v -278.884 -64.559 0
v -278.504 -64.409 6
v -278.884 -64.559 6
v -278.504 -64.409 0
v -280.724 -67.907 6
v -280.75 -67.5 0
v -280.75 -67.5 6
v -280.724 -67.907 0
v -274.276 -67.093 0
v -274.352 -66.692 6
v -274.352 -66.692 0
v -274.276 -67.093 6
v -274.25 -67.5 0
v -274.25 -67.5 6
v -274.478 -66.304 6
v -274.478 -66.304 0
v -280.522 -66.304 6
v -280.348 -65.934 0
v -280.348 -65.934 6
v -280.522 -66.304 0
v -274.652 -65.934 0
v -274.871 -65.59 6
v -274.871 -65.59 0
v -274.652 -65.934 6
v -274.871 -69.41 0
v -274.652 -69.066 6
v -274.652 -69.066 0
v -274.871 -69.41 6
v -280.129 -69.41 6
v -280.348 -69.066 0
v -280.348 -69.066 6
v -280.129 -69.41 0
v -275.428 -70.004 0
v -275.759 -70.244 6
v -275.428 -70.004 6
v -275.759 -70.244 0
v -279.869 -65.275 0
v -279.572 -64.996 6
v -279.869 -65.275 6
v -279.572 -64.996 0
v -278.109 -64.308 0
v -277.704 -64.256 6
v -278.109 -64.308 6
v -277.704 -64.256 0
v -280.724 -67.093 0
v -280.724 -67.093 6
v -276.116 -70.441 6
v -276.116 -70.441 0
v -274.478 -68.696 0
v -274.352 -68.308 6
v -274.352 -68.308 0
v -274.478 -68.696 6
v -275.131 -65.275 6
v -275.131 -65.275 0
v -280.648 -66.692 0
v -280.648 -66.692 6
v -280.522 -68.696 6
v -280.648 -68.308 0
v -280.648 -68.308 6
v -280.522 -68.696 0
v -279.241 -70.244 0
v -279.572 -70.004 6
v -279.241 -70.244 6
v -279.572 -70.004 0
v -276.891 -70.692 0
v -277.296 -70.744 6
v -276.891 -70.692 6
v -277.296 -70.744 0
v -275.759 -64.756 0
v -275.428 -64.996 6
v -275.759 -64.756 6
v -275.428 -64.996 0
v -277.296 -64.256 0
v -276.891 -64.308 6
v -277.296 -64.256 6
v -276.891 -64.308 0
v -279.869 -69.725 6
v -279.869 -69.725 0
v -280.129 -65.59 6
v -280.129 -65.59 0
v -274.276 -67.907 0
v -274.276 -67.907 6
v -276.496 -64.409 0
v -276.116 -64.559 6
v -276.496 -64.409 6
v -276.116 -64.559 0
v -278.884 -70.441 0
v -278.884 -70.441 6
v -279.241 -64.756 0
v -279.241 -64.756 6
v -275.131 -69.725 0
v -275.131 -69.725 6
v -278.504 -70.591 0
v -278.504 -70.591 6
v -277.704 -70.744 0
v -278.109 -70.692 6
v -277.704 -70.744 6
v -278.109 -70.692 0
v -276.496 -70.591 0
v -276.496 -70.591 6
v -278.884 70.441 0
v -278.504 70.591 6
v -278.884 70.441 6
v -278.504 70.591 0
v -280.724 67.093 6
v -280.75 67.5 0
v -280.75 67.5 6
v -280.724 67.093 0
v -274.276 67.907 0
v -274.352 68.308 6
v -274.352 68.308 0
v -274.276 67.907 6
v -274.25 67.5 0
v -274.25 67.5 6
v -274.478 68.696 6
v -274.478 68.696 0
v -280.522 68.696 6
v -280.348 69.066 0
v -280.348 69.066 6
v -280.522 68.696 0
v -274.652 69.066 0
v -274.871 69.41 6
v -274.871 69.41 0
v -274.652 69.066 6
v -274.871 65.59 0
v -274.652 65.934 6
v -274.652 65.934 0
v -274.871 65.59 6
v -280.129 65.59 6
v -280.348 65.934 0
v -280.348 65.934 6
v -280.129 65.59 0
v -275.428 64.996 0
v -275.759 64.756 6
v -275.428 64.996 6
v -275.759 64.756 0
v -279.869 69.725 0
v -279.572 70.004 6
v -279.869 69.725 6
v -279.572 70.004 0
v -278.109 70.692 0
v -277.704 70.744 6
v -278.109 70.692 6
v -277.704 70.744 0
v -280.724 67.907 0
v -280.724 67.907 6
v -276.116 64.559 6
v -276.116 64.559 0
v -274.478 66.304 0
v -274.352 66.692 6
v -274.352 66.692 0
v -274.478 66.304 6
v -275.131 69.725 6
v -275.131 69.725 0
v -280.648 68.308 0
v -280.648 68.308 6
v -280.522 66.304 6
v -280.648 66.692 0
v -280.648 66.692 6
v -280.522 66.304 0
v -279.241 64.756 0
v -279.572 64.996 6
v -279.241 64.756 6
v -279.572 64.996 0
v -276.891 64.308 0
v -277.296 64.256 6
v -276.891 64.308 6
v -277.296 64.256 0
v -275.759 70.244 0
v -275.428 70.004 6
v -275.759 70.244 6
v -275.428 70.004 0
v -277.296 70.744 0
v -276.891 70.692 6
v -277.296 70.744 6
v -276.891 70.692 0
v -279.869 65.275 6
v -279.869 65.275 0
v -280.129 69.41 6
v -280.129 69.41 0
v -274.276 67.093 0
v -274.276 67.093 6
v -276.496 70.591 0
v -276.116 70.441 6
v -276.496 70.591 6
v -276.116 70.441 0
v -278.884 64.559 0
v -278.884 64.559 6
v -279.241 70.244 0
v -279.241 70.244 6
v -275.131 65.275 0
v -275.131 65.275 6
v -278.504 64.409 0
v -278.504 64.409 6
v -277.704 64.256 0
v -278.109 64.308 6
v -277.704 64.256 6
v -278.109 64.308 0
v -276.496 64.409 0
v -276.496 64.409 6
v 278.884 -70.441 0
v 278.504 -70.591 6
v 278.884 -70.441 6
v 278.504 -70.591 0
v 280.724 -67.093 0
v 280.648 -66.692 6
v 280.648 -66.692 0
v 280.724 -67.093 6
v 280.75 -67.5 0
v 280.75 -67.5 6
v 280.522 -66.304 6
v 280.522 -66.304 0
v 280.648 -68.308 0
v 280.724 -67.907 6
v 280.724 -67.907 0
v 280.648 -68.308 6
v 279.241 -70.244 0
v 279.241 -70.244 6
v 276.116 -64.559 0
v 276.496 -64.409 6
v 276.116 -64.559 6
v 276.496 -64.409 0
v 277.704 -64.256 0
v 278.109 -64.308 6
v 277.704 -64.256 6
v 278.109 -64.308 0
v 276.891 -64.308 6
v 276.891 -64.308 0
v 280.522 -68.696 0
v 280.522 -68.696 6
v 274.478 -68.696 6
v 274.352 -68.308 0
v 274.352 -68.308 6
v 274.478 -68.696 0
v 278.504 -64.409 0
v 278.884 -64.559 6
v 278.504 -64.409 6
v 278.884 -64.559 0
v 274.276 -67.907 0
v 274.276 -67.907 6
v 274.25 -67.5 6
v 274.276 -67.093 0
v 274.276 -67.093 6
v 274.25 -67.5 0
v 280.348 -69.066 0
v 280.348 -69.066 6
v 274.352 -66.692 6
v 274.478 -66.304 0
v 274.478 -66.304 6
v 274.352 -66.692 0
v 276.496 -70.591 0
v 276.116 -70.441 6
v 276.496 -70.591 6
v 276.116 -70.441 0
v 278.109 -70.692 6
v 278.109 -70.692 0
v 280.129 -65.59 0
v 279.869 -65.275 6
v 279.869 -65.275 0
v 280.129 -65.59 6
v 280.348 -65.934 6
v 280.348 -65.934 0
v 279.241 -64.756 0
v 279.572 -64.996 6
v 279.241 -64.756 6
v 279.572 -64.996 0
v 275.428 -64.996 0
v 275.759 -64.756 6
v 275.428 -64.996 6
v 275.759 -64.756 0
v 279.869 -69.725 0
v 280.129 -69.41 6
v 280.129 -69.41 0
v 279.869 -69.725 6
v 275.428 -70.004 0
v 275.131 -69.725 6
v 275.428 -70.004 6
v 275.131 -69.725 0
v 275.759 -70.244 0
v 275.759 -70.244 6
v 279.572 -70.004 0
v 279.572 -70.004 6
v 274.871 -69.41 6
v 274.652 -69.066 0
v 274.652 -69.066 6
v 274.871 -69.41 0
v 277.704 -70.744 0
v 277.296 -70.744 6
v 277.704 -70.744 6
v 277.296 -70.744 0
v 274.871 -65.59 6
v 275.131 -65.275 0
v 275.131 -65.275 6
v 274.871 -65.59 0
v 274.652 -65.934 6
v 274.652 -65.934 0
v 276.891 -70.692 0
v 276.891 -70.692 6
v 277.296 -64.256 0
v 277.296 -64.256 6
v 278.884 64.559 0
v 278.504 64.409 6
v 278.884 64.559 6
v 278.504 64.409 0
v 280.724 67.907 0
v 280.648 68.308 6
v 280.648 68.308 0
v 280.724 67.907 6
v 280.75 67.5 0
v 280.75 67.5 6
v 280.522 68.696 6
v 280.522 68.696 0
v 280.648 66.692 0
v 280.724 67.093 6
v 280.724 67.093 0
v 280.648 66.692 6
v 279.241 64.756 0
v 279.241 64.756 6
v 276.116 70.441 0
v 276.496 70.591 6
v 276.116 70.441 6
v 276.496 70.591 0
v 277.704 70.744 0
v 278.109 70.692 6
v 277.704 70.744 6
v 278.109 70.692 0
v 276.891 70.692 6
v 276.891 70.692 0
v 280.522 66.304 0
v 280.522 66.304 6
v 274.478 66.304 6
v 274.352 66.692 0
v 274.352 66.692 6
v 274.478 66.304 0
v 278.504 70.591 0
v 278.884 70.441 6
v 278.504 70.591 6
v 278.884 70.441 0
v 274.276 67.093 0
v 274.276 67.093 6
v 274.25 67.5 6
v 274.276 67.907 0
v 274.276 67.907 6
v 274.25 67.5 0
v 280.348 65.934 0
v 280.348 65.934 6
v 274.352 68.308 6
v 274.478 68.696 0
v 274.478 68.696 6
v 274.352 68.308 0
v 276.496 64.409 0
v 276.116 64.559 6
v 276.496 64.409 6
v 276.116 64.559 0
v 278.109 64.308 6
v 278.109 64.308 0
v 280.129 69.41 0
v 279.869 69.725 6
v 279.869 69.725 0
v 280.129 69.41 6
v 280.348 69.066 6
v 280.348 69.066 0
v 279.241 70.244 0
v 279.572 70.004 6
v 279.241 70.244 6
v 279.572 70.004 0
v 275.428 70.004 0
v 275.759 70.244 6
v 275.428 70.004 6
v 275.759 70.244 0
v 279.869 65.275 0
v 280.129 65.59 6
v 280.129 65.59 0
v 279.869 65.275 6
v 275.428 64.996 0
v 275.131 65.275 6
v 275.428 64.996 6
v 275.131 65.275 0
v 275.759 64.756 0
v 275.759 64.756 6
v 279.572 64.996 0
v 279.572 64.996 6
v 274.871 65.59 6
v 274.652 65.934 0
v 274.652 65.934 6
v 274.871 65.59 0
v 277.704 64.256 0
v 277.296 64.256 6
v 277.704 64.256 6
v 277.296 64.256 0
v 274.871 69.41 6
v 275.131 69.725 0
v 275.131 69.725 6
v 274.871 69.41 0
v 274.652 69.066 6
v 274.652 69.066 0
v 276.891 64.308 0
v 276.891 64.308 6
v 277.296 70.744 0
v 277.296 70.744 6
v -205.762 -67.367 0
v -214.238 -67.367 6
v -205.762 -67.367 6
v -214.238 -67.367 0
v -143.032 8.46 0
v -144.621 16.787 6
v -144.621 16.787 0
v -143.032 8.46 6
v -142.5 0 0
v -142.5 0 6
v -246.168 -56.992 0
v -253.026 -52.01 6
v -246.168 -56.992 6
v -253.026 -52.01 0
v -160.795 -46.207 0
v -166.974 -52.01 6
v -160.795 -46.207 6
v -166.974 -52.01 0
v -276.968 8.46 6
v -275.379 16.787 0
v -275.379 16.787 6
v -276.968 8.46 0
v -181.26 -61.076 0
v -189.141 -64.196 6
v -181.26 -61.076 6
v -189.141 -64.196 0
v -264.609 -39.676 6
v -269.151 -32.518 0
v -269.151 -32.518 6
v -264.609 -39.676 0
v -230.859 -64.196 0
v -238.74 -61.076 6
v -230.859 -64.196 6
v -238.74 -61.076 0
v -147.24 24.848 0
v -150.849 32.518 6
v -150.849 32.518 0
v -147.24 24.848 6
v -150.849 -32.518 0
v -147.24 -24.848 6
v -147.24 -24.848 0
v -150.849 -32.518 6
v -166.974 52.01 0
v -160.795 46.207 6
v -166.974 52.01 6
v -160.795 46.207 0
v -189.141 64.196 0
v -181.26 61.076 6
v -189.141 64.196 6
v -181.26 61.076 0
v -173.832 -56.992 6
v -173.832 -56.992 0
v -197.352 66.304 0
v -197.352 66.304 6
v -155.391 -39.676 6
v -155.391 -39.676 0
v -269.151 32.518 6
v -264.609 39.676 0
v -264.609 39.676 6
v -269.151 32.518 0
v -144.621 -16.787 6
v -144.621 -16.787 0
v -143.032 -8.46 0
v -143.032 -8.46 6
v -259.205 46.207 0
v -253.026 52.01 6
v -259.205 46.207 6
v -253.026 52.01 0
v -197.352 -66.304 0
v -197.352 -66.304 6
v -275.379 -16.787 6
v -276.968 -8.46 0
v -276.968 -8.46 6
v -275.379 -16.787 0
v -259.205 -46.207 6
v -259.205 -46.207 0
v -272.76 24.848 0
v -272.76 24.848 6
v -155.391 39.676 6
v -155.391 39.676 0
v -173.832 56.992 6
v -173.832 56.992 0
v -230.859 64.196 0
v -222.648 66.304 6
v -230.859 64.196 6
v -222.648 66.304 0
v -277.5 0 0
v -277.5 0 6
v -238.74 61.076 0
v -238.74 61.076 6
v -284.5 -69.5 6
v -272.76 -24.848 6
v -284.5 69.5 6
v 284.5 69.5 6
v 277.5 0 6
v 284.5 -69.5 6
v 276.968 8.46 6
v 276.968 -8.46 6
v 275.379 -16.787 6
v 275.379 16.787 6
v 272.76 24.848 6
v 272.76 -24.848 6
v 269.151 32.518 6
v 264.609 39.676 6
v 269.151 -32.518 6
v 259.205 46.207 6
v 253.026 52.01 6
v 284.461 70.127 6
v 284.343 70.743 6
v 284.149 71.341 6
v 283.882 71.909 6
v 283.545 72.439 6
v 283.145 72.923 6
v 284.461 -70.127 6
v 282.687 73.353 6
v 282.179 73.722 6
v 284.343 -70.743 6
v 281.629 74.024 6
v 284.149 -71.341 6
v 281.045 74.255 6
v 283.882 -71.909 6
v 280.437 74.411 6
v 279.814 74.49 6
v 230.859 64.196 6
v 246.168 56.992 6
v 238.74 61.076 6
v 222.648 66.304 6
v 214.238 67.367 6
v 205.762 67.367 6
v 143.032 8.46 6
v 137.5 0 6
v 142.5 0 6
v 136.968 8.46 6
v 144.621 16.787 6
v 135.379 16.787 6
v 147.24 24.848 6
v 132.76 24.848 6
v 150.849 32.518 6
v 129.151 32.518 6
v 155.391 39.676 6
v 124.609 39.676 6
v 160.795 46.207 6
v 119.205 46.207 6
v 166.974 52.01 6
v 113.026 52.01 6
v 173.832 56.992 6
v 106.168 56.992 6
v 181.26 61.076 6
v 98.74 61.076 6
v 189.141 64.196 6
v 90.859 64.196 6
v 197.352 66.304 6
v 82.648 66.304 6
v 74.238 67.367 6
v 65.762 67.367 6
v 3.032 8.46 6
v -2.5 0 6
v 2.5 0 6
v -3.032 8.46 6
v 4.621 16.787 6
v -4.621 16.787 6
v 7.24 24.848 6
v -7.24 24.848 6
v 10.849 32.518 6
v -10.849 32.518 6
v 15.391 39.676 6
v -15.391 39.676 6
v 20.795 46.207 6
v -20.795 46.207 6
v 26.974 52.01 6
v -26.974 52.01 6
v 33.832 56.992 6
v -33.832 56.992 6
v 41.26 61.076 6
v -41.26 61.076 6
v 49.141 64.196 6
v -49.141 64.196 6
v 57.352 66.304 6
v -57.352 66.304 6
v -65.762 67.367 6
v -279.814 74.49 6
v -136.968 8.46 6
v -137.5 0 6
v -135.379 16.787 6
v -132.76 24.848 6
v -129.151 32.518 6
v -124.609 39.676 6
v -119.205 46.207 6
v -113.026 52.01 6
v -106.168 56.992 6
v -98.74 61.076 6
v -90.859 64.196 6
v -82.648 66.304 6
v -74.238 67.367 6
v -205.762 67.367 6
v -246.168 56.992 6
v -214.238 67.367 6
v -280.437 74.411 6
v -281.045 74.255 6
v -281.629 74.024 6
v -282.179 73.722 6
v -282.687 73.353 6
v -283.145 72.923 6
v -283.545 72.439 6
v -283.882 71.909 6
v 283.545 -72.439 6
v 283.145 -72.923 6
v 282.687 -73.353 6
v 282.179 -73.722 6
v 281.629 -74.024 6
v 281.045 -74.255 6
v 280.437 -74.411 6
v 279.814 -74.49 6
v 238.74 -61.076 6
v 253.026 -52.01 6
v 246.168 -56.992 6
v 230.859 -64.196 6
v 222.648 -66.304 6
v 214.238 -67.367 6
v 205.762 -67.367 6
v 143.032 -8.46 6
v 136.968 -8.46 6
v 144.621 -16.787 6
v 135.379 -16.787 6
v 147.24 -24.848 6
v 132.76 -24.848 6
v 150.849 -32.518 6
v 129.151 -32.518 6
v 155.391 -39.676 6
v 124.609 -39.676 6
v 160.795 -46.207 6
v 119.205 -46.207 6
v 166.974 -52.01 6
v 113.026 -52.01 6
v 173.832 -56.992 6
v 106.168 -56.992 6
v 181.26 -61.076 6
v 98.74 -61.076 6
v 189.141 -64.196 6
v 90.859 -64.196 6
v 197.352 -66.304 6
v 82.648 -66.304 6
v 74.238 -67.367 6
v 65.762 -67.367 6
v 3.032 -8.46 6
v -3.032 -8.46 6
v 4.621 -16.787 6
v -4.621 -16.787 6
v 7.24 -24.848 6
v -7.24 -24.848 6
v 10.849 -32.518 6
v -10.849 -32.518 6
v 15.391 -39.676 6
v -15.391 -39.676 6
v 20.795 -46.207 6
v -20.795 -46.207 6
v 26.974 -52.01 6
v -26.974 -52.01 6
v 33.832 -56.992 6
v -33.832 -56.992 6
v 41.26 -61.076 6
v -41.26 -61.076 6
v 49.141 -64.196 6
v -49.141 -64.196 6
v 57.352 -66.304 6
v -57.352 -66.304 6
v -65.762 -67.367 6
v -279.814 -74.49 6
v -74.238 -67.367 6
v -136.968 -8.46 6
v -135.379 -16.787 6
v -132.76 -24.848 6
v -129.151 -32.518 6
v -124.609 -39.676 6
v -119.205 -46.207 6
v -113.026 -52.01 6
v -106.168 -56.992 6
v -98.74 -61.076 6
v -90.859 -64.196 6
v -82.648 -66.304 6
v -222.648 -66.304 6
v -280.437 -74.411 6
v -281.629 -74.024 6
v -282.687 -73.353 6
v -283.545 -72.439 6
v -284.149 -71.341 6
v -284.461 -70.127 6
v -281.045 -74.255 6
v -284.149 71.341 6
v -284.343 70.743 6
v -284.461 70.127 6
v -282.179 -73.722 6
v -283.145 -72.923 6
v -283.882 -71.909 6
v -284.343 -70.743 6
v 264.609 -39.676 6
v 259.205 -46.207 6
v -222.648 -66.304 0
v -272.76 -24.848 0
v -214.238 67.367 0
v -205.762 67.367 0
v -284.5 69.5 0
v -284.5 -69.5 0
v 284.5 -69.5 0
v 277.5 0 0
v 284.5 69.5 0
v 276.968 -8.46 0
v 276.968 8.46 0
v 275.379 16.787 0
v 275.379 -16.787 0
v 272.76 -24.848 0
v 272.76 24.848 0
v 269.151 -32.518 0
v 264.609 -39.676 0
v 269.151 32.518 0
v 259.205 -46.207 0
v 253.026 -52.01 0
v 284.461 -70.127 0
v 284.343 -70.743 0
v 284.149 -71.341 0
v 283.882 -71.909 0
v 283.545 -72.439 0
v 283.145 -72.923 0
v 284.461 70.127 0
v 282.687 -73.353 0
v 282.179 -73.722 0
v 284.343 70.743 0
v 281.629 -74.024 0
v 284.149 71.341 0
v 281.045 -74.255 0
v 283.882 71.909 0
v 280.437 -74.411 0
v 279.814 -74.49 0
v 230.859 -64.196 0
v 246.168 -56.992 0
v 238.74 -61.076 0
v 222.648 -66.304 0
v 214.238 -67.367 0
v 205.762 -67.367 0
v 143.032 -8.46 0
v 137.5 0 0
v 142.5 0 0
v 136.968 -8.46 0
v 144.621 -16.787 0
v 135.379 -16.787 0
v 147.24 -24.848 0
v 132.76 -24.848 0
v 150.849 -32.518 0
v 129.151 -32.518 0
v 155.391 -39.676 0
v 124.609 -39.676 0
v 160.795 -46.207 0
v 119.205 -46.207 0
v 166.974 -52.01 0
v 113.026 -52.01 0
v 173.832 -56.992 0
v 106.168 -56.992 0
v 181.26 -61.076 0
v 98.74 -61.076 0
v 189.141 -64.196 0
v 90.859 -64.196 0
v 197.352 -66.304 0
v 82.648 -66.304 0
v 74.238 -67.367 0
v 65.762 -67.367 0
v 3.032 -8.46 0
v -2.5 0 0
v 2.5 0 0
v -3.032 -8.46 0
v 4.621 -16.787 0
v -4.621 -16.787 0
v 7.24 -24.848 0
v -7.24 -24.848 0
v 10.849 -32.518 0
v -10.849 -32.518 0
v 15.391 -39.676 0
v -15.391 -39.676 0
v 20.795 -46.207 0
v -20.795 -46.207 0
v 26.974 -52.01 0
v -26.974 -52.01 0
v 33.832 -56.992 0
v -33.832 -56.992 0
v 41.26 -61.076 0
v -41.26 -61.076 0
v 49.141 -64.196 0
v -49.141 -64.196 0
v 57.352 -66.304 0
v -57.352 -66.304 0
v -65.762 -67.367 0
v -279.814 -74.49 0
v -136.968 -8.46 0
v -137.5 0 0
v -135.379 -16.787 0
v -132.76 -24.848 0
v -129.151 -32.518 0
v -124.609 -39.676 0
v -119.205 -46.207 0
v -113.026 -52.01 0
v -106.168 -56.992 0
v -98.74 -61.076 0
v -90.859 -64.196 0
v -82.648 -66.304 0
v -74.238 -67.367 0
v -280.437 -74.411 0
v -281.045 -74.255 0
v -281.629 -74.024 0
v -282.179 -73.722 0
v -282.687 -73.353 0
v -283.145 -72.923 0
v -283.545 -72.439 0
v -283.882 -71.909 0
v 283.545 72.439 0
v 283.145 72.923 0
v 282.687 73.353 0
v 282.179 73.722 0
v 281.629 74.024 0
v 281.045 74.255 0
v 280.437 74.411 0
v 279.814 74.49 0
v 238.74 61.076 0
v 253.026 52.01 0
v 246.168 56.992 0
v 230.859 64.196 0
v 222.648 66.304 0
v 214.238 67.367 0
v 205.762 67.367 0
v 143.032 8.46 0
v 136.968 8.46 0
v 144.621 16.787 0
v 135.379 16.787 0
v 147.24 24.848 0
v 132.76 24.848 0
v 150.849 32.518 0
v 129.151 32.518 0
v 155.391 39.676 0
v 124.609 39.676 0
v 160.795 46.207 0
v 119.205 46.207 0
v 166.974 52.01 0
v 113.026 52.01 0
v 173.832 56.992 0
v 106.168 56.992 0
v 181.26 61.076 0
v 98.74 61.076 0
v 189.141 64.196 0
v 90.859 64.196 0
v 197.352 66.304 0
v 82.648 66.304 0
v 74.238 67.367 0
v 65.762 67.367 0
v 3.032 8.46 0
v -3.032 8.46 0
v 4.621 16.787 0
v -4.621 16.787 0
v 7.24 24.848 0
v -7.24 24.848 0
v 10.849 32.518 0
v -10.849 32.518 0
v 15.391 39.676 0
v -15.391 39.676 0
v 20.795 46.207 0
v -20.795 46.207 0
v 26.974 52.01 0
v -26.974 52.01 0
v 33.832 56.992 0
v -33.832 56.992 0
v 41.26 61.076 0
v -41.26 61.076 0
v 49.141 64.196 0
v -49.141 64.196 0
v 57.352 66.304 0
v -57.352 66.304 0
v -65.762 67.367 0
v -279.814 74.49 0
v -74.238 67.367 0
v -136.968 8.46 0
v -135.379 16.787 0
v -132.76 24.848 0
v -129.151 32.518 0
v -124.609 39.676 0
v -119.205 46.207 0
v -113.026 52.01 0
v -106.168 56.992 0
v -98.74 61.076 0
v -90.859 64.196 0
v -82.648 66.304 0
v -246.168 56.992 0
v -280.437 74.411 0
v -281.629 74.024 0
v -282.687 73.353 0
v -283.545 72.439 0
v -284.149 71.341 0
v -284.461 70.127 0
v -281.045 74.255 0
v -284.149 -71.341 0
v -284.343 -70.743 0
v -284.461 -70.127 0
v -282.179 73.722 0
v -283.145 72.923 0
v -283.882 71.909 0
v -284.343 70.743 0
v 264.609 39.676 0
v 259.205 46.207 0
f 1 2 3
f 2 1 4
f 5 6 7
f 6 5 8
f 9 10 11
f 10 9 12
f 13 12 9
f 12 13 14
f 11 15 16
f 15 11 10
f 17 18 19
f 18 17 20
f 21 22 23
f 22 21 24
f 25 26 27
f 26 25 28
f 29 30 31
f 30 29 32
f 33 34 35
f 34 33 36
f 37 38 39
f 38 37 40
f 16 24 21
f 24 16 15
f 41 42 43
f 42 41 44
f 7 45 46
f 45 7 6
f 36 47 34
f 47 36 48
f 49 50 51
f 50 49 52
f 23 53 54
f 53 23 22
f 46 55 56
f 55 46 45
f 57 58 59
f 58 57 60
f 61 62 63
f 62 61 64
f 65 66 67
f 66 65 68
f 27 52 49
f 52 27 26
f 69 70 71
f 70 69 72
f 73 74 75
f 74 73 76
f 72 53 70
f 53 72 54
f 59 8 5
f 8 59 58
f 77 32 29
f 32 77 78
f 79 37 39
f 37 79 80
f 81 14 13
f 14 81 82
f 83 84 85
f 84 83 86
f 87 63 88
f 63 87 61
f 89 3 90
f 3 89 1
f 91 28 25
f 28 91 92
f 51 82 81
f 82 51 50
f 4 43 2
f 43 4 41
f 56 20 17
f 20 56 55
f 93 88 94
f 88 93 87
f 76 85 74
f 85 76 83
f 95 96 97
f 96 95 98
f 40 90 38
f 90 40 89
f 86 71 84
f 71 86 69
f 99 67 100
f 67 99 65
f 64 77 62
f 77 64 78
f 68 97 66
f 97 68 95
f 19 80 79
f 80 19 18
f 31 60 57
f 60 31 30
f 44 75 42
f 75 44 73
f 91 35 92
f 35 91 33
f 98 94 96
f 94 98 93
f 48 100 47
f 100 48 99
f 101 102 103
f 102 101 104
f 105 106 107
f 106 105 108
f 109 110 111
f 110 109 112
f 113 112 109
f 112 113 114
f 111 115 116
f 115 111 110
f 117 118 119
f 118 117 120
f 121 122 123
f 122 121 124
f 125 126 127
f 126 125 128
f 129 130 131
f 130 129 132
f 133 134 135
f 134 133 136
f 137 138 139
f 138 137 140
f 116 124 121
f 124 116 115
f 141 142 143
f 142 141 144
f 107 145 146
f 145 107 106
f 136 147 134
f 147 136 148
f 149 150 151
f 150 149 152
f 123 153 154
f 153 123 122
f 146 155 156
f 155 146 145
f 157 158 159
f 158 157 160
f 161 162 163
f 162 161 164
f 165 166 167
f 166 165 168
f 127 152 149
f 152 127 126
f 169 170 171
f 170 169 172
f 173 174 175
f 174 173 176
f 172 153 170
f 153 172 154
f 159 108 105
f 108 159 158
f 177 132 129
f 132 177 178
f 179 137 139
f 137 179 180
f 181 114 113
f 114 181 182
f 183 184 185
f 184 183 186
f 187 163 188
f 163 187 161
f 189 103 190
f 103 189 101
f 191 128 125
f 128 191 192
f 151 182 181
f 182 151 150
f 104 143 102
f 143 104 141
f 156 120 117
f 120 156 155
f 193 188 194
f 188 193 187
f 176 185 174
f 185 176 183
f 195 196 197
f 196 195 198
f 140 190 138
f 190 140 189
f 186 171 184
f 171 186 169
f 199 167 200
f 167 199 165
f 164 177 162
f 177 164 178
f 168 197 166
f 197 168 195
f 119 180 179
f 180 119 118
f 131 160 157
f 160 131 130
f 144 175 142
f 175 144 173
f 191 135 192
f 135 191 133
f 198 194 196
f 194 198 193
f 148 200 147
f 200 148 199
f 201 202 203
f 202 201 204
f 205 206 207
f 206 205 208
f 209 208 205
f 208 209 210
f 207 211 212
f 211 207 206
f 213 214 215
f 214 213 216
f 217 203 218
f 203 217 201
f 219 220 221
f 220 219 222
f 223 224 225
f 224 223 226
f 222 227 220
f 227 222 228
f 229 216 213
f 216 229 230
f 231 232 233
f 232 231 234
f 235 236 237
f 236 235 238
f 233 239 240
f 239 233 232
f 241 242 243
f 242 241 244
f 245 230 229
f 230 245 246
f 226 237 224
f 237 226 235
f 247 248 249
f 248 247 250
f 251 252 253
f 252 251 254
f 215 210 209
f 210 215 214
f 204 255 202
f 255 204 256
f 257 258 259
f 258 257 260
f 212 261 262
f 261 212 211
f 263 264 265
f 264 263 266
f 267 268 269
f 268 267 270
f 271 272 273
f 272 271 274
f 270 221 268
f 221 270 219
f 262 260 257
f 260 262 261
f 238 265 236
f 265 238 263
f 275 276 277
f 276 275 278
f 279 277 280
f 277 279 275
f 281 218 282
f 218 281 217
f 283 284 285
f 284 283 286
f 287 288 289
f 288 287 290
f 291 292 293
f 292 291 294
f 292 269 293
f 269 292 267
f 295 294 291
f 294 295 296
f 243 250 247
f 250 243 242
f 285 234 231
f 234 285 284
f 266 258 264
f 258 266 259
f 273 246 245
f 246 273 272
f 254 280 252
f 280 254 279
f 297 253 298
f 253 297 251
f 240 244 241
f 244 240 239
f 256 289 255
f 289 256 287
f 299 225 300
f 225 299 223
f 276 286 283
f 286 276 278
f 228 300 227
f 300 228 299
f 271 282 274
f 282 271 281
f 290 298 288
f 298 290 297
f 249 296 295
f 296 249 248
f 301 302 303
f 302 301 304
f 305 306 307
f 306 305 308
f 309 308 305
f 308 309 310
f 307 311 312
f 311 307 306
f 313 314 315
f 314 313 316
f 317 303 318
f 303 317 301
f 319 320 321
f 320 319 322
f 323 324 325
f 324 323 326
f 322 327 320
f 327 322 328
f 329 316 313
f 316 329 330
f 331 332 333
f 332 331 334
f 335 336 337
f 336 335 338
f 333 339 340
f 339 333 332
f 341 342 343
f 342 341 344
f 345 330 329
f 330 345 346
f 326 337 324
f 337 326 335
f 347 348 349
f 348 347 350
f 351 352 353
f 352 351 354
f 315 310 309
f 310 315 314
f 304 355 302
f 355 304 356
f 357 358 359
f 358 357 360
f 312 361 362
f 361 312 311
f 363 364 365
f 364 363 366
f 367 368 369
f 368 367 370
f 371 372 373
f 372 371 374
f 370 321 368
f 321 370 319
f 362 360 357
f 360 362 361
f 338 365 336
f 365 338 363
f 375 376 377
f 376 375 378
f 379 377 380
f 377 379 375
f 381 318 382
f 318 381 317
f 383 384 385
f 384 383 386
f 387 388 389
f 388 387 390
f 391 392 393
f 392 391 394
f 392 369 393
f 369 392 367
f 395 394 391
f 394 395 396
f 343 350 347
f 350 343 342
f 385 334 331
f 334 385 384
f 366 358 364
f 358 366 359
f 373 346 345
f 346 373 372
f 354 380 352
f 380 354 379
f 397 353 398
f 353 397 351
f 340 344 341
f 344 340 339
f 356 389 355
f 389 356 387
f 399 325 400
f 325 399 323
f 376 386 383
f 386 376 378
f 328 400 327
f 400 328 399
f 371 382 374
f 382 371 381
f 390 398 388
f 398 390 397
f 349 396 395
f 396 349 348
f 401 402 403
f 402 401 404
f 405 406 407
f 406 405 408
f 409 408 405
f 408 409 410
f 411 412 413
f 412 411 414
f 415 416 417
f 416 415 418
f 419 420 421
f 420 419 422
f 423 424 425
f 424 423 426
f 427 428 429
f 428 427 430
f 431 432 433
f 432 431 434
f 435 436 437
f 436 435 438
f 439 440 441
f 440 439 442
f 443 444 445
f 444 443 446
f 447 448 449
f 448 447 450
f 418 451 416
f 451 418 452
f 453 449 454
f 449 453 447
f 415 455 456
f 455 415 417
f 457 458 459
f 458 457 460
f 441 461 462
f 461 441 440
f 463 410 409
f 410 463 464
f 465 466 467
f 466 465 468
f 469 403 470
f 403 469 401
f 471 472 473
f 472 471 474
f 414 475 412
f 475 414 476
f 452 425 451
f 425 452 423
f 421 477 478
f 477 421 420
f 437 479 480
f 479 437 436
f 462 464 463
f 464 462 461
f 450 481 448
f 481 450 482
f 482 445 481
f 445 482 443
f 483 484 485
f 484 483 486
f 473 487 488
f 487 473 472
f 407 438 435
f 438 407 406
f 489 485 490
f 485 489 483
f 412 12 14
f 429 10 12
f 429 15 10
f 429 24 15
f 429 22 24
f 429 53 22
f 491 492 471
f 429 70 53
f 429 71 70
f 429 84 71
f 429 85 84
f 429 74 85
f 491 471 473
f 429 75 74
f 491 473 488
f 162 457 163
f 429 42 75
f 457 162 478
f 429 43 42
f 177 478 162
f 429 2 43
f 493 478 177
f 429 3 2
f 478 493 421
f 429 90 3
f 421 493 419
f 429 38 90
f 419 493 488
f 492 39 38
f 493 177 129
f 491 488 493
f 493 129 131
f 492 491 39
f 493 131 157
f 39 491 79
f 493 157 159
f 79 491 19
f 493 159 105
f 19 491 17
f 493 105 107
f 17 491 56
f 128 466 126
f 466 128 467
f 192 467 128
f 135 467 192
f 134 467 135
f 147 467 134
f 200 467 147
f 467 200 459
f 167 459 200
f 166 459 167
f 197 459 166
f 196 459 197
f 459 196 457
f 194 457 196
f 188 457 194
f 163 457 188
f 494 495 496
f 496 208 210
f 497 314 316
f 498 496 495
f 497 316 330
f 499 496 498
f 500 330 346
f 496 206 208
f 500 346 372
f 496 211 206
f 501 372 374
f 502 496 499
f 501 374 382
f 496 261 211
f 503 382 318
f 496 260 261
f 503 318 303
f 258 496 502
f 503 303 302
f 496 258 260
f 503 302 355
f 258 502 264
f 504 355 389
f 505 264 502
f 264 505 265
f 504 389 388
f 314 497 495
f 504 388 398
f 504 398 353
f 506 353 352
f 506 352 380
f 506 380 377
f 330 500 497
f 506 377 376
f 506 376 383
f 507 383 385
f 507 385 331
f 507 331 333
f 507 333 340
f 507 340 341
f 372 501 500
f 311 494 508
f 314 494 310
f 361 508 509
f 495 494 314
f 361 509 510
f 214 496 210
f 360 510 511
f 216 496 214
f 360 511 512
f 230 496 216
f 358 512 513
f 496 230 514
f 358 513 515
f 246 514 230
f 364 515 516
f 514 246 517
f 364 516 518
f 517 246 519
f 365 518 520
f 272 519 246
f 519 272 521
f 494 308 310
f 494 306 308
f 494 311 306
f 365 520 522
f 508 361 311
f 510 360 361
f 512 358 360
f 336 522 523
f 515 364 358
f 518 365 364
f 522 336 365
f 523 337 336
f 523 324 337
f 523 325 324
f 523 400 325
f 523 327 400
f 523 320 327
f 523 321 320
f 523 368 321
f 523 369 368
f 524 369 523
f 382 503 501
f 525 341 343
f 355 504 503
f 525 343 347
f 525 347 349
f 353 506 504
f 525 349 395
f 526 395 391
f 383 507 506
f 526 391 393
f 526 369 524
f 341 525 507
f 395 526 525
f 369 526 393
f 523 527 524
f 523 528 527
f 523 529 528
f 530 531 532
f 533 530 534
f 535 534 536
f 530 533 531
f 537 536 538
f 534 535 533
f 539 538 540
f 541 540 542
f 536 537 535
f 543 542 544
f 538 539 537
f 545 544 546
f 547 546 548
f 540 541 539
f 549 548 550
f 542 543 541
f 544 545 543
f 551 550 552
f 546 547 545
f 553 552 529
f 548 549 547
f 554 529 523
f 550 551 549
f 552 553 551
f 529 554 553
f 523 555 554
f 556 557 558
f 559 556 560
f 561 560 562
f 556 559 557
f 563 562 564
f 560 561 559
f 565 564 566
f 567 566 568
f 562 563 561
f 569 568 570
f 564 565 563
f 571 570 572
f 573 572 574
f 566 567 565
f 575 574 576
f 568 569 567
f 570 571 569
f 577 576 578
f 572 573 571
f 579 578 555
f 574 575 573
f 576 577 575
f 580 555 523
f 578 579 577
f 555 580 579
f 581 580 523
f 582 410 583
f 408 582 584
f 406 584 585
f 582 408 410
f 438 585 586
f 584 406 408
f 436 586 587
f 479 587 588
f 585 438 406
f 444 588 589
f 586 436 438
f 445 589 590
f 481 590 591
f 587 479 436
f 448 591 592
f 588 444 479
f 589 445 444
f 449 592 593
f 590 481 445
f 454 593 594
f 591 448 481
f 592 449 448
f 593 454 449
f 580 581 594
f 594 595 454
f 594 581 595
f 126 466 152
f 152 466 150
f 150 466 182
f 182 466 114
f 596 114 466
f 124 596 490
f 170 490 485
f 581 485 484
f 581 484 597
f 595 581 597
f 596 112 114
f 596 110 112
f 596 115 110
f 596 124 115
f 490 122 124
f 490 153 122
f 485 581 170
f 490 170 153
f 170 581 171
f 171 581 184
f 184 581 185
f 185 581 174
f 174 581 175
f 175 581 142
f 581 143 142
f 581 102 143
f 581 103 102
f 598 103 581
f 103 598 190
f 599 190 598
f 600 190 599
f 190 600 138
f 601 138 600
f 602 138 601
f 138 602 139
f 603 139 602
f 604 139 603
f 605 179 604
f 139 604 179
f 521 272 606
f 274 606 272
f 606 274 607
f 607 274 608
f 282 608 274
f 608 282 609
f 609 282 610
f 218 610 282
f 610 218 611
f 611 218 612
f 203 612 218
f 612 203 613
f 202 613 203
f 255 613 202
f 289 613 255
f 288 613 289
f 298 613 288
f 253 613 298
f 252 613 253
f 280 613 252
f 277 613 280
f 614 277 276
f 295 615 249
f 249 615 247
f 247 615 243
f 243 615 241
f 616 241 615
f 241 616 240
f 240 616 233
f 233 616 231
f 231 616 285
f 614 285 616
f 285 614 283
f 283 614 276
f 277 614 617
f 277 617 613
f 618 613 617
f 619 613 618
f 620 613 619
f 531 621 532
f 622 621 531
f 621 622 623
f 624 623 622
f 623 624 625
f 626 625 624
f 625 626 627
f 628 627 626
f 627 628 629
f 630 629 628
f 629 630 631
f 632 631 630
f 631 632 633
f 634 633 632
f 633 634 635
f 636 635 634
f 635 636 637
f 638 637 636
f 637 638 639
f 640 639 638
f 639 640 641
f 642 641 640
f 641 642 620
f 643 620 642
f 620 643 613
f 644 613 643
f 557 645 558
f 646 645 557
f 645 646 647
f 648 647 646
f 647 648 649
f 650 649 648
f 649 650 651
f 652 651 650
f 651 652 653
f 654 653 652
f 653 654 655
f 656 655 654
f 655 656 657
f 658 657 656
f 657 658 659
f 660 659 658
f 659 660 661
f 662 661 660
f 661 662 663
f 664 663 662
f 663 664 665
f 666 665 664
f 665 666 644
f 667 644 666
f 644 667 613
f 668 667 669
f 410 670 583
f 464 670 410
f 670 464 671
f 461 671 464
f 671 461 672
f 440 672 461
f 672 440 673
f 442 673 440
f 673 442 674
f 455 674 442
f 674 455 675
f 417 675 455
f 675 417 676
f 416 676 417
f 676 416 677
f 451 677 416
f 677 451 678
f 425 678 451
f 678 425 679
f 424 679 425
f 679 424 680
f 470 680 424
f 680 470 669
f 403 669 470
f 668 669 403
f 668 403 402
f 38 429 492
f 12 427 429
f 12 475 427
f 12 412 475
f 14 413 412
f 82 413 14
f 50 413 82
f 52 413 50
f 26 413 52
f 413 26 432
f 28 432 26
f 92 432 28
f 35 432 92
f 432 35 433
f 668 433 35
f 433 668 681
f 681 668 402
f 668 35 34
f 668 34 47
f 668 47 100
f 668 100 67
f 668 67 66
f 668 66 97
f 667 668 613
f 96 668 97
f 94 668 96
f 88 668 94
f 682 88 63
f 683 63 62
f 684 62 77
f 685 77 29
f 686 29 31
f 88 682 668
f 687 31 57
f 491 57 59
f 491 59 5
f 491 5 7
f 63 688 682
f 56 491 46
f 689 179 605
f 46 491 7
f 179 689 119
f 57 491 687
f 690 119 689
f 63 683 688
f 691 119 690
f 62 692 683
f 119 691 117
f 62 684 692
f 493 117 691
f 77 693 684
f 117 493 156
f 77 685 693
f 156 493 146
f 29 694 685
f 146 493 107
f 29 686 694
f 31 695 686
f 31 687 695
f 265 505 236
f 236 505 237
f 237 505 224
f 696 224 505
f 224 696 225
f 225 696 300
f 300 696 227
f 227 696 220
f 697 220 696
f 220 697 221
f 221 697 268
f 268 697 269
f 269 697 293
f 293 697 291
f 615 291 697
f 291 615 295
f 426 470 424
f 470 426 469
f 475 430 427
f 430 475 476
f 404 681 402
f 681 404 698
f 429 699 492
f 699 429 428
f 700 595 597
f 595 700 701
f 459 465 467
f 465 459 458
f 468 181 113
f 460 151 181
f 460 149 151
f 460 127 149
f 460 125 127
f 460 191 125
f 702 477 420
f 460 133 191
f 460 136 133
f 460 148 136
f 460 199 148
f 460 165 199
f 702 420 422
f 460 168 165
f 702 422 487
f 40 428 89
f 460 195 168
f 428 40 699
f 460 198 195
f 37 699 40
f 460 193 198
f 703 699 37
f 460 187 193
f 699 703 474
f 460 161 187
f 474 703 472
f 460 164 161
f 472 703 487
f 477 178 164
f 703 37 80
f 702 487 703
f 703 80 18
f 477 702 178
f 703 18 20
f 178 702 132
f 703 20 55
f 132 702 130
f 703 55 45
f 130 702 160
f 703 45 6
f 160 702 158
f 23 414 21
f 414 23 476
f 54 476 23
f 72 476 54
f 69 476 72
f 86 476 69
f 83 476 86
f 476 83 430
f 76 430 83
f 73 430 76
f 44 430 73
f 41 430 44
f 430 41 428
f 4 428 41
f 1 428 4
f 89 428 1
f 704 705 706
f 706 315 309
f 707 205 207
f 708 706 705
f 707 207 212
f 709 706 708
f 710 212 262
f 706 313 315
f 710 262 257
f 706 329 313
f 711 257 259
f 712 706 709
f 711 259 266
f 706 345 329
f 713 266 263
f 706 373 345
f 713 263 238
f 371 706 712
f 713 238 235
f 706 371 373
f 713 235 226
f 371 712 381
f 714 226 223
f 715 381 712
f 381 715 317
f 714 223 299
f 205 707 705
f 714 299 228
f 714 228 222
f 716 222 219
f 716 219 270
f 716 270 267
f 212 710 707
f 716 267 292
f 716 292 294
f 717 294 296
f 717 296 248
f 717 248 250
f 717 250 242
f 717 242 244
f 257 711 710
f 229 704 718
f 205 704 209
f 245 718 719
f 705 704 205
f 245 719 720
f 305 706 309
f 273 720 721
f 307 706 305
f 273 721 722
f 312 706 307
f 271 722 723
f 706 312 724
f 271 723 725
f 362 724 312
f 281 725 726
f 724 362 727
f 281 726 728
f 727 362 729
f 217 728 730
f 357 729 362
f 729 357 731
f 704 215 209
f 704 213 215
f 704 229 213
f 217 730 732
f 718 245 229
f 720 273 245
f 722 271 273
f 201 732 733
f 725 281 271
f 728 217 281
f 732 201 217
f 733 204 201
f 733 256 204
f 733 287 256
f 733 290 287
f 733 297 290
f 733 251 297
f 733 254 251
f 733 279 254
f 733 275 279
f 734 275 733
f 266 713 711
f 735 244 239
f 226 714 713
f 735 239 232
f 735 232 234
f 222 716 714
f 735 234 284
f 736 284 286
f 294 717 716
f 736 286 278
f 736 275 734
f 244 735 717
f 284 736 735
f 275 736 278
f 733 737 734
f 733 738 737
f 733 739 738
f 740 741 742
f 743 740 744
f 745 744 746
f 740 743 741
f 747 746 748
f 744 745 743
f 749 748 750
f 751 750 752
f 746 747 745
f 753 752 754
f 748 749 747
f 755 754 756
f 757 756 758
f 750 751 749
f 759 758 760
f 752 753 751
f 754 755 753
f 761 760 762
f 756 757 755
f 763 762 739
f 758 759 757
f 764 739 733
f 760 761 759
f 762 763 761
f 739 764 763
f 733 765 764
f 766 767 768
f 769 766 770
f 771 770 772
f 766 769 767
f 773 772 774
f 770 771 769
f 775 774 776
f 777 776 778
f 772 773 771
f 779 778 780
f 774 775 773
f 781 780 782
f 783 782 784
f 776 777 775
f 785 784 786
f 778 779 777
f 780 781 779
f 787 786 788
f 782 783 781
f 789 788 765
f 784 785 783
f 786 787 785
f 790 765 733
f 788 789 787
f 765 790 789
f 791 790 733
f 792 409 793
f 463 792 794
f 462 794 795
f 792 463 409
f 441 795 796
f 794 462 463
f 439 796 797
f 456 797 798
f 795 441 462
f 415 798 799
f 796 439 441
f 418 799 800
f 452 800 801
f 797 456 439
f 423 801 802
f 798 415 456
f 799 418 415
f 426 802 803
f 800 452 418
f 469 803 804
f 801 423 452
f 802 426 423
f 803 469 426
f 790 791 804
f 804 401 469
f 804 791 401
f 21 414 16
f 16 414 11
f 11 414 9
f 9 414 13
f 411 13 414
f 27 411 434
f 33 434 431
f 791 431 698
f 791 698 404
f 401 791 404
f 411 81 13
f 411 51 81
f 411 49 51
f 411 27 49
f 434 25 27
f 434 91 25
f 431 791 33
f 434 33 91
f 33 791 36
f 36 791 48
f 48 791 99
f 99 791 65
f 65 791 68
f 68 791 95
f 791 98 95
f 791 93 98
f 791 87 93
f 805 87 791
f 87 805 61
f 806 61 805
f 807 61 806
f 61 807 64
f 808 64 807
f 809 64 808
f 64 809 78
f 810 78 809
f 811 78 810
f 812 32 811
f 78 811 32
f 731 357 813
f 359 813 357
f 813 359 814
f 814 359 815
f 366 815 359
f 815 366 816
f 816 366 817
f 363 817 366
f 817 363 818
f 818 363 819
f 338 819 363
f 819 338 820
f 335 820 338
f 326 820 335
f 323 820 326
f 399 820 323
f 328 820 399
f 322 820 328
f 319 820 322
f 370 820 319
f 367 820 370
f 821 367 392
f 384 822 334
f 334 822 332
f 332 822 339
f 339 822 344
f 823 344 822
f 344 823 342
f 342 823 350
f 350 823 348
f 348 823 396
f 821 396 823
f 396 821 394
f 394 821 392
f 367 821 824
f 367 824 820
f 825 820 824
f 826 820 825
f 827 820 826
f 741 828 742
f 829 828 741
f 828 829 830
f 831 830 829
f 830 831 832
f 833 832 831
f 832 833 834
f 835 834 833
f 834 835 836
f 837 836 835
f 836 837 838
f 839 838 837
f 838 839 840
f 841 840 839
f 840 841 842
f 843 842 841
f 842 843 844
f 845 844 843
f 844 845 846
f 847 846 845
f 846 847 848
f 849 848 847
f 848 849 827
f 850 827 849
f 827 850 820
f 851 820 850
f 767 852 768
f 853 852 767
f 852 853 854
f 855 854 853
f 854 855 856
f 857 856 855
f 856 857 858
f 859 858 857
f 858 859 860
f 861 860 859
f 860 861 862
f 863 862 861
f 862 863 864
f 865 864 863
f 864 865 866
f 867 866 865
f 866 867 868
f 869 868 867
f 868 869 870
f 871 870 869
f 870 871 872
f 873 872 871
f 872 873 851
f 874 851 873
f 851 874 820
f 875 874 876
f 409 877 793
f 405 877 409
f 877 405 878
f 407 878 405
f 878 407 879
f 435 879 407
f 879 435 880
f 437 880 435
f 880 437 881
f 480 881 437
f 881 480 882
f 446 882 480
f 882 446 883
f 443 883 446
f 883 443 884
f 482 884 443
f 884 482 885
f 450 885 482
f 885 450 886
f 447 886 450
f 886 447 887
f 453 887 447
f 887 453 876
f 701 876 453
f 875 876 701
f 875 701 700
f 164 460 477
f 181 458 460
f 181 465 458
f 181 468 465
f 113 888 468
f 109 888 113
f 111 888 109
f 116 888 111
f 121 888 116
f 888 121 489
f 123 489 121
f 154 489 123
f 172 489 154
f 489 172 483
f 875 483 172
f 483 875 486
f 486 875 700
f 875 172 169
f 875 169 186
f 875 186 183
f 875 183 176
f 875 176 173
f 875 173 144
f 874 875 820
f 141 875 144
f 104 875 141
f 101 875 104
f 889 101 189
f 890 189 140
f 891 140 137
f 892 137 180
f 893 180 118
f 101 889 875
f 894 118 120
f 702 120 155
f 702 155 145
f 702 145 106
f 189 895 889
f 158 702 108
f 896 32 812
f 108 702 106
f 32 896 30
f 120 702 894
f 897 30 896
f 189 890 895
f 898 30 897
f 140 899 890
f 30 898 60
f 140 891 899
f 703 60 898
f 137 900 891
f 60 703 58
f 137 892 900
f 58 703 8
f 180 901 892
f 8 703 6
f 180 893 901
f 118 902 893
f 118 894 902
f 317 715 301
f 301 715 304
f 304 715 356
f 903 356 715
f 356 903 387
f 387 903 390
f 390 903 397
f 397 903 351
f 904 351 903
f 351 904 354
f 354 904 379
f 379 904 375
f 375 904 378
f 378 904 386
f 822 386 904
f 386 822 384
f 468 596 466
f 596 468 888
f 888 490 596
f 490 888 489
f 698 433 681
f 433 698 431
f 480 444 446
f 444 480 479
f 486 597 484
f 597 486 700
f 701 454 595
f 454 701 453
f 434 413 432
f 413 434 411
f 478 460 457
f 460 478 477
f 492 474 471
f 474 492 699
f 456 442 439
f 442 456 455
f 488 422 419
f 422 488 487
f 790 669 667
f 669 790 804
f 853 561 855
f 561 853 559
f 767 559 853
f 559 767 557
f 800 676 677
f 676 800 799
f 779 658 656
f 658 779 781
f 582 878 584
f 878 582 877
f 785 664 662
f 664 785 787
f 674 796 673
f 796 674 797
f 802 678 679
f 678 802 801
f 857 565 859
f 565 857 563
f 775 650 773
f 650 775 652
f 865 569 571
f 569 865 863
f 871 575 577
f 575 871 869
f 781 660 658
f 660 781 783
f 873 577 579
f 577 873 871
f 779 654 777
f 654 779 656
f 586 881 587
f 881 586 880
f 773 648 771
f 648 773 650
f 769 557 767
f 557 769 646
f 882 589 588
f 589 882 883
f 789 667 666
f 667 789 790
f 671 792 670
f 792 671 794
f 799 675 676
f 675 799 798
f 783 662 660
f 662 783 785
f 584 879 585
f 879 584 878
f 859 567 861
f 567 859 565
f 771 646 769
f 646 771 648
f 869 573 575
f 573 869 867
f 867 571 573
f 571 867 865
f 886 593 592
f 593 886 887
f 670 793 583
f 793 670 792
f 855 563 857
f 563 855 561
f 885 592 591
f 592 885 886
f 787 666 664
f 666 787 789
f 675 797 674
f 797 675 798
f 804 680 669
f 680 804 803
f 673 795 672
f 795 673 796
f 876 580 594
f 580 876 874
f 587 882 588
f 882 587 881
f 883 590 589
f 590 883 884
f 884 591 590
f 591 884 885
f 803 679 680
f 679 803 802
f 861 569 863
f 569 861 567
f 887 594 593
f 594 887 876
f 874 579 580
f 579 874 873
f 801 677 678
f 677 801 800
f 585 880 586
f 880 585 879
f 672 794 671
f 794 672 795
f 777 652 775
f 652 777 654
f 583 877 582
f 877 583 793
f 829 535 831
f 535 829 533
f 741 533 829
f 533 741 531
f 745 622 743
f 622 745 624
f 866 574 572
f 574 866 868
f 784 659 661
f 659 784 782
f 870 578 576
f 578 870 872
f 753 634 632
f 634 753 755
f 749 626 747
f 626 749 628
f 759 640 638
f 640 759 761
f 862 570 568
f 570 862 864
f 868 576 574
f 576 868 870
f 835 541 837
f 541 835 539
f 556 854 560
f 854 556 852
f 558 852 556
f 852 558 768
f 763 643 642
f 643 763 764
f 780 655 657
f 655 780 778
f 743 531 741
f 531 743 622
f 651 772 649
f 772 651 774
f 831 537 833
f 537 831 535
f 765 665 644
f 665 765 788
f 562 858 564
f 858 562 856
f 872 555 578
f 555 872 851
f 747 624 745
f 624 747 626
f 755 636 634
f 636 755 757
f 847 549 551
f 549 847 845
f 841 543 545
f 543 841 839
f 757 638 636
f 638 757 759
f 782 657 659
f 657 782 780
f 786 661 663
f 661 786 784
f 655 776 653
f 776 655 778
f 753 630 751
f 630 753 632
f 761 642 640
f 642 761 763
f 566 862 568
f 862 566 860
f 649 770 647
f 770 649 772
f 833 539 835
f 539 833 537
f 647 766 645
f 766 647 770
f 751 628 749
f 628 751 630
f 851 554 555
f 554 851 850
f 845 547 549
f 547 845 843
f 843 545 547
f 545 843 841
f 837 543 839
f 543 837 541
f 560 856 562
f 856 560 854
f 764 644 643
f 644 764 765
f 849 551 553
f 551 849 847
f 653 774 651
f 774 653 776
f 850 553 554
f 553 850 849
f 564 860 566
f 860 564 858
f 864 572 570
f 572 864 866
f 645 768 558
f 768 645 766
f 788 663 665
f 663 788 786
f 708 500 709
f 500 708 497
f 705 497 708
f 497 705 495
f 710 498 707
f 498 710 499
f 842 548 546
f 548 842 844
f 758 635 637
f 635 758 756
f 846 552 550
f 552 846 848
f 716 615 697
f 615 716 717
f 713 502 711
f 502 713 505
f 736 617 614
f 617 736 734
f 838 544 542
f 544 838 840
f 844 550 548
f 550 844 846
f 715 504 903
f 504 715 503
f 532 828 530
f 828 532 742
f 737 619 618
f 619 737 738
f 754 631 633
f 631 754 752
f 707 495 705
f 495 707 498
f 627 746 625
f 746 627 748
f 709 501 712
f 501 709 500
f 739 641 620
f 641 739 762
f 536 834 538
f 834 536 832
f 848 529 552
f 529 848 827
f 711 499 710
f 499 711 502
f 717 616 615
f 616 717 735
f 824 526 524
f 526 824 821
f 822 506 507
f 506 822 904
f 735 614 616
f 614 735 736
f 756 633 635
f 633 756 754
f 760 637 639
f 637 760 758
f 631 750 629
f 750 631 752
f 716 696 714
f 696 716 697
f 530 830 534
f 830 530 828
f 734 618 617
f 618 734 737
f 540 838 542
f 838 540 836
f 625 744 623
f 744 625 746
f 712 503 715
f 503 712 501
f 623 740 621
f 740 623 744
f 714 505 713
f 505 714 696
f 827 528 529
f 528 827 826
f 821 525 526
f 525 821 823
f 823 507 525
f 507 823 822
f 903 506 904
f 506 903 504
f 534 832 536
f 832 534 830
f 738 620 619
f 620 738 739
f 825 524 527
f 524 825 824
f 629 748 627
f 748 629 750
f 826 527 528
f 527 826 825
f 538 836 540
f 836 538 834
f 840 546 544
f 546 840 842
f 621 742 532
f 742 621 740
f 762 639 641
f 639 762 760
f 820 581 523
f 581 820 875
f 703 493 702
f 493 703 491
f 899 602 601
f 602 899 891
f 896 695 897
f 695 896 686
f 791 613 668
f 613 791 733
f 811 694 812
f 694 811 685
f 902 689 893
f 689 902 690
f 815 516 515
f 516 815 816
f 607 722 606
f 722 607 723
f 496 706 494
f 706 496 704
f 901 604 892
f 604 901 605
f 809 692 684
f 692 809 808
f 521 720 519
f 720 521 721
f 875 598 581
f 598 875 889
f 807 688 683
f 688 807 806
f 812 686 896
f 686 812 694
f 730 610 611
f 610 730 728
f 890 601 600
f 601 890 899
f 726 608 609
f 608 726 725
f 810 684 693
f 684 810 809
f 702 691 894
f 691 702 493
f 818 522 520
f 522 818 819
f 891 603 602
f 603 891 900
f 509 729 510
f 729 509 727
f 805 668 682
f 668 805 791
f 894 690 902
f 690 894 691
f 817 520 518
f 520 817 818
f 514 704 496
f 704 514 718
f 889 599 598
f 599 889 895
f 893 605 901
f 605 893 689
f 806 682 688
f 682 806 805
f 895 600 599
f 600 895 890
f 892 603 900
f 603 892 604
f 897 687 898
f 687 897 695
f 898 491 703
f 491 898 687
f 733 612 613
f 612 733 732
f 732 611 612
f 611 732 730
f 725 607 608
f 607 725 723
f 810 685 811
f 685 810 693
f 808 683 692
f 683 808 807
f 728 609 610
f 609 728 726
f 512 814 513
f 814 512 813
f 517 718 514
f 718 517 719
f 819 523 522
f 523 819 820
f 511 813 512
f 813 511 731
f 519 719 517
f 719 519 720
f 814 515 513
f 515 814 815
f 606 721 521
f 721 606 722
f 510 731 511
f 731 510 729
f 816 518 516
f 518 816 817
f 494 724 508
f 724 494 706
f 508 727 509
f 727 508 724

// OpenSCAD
$fn = 50;


difference() {
	union() {
		hull() {
			translate(v = [-279.5000000000, 69.5000000000, 0]) {
				cylinder(h = 6, r = 5);
			}
			translate(v = [279.5000000000, 69.5000000000, 0]) {
				cylinder(h = 6, r = 5);
			}
			translate(v = [-279.5000000000, -69.5000000000, 0]) {
				cylinder(h = 6, r = 5);
			}
			translate(v = [279.5000000000, -69.5000000000, 0]) {
				cylinder(h = 6, r = 5);
			}
		}
	}
	union() {
		#translate(v = [-277.5000000000, -67.5000000000, -100.0000000000]) {
			cylinder(h = 200, r = 3.2500000000);
		}
		#translate(v = [-277.5000000000, 67.5000000000, -100.0000000000]) {
			cylinder(h = 200, r = 3.2500000000);
		}
		#translate(v = [277.5000000000, -67.5000000000, -100.0000000000]) {
			cylinder(h = 200, r = 3.2500000000);
		}
		#translate(v = [277.5000000000, 67.5000000000, -100.0000000000]) {
			cylinder(h = 200, r = 3.2500000000);
		}
		#translate(v = [-210.0000000000, 0, 0]) {
			cylinder(h = 6, r = 67.5000000000);
		}
		#translate(v = [-70.0000000000, 0, 0]) {
			cylinder(h = 6, r = 67.5000000000);
		}
		#translate(v = [70.0000000000, 0, 0]) {
			cylinder(h = 6, r = 67.5000000000);
		}
		#translate(v = [210.0000000000, 0, 0]) {
			cylinder(h = 6, r = 67.5000000000);
		}
	}
}
